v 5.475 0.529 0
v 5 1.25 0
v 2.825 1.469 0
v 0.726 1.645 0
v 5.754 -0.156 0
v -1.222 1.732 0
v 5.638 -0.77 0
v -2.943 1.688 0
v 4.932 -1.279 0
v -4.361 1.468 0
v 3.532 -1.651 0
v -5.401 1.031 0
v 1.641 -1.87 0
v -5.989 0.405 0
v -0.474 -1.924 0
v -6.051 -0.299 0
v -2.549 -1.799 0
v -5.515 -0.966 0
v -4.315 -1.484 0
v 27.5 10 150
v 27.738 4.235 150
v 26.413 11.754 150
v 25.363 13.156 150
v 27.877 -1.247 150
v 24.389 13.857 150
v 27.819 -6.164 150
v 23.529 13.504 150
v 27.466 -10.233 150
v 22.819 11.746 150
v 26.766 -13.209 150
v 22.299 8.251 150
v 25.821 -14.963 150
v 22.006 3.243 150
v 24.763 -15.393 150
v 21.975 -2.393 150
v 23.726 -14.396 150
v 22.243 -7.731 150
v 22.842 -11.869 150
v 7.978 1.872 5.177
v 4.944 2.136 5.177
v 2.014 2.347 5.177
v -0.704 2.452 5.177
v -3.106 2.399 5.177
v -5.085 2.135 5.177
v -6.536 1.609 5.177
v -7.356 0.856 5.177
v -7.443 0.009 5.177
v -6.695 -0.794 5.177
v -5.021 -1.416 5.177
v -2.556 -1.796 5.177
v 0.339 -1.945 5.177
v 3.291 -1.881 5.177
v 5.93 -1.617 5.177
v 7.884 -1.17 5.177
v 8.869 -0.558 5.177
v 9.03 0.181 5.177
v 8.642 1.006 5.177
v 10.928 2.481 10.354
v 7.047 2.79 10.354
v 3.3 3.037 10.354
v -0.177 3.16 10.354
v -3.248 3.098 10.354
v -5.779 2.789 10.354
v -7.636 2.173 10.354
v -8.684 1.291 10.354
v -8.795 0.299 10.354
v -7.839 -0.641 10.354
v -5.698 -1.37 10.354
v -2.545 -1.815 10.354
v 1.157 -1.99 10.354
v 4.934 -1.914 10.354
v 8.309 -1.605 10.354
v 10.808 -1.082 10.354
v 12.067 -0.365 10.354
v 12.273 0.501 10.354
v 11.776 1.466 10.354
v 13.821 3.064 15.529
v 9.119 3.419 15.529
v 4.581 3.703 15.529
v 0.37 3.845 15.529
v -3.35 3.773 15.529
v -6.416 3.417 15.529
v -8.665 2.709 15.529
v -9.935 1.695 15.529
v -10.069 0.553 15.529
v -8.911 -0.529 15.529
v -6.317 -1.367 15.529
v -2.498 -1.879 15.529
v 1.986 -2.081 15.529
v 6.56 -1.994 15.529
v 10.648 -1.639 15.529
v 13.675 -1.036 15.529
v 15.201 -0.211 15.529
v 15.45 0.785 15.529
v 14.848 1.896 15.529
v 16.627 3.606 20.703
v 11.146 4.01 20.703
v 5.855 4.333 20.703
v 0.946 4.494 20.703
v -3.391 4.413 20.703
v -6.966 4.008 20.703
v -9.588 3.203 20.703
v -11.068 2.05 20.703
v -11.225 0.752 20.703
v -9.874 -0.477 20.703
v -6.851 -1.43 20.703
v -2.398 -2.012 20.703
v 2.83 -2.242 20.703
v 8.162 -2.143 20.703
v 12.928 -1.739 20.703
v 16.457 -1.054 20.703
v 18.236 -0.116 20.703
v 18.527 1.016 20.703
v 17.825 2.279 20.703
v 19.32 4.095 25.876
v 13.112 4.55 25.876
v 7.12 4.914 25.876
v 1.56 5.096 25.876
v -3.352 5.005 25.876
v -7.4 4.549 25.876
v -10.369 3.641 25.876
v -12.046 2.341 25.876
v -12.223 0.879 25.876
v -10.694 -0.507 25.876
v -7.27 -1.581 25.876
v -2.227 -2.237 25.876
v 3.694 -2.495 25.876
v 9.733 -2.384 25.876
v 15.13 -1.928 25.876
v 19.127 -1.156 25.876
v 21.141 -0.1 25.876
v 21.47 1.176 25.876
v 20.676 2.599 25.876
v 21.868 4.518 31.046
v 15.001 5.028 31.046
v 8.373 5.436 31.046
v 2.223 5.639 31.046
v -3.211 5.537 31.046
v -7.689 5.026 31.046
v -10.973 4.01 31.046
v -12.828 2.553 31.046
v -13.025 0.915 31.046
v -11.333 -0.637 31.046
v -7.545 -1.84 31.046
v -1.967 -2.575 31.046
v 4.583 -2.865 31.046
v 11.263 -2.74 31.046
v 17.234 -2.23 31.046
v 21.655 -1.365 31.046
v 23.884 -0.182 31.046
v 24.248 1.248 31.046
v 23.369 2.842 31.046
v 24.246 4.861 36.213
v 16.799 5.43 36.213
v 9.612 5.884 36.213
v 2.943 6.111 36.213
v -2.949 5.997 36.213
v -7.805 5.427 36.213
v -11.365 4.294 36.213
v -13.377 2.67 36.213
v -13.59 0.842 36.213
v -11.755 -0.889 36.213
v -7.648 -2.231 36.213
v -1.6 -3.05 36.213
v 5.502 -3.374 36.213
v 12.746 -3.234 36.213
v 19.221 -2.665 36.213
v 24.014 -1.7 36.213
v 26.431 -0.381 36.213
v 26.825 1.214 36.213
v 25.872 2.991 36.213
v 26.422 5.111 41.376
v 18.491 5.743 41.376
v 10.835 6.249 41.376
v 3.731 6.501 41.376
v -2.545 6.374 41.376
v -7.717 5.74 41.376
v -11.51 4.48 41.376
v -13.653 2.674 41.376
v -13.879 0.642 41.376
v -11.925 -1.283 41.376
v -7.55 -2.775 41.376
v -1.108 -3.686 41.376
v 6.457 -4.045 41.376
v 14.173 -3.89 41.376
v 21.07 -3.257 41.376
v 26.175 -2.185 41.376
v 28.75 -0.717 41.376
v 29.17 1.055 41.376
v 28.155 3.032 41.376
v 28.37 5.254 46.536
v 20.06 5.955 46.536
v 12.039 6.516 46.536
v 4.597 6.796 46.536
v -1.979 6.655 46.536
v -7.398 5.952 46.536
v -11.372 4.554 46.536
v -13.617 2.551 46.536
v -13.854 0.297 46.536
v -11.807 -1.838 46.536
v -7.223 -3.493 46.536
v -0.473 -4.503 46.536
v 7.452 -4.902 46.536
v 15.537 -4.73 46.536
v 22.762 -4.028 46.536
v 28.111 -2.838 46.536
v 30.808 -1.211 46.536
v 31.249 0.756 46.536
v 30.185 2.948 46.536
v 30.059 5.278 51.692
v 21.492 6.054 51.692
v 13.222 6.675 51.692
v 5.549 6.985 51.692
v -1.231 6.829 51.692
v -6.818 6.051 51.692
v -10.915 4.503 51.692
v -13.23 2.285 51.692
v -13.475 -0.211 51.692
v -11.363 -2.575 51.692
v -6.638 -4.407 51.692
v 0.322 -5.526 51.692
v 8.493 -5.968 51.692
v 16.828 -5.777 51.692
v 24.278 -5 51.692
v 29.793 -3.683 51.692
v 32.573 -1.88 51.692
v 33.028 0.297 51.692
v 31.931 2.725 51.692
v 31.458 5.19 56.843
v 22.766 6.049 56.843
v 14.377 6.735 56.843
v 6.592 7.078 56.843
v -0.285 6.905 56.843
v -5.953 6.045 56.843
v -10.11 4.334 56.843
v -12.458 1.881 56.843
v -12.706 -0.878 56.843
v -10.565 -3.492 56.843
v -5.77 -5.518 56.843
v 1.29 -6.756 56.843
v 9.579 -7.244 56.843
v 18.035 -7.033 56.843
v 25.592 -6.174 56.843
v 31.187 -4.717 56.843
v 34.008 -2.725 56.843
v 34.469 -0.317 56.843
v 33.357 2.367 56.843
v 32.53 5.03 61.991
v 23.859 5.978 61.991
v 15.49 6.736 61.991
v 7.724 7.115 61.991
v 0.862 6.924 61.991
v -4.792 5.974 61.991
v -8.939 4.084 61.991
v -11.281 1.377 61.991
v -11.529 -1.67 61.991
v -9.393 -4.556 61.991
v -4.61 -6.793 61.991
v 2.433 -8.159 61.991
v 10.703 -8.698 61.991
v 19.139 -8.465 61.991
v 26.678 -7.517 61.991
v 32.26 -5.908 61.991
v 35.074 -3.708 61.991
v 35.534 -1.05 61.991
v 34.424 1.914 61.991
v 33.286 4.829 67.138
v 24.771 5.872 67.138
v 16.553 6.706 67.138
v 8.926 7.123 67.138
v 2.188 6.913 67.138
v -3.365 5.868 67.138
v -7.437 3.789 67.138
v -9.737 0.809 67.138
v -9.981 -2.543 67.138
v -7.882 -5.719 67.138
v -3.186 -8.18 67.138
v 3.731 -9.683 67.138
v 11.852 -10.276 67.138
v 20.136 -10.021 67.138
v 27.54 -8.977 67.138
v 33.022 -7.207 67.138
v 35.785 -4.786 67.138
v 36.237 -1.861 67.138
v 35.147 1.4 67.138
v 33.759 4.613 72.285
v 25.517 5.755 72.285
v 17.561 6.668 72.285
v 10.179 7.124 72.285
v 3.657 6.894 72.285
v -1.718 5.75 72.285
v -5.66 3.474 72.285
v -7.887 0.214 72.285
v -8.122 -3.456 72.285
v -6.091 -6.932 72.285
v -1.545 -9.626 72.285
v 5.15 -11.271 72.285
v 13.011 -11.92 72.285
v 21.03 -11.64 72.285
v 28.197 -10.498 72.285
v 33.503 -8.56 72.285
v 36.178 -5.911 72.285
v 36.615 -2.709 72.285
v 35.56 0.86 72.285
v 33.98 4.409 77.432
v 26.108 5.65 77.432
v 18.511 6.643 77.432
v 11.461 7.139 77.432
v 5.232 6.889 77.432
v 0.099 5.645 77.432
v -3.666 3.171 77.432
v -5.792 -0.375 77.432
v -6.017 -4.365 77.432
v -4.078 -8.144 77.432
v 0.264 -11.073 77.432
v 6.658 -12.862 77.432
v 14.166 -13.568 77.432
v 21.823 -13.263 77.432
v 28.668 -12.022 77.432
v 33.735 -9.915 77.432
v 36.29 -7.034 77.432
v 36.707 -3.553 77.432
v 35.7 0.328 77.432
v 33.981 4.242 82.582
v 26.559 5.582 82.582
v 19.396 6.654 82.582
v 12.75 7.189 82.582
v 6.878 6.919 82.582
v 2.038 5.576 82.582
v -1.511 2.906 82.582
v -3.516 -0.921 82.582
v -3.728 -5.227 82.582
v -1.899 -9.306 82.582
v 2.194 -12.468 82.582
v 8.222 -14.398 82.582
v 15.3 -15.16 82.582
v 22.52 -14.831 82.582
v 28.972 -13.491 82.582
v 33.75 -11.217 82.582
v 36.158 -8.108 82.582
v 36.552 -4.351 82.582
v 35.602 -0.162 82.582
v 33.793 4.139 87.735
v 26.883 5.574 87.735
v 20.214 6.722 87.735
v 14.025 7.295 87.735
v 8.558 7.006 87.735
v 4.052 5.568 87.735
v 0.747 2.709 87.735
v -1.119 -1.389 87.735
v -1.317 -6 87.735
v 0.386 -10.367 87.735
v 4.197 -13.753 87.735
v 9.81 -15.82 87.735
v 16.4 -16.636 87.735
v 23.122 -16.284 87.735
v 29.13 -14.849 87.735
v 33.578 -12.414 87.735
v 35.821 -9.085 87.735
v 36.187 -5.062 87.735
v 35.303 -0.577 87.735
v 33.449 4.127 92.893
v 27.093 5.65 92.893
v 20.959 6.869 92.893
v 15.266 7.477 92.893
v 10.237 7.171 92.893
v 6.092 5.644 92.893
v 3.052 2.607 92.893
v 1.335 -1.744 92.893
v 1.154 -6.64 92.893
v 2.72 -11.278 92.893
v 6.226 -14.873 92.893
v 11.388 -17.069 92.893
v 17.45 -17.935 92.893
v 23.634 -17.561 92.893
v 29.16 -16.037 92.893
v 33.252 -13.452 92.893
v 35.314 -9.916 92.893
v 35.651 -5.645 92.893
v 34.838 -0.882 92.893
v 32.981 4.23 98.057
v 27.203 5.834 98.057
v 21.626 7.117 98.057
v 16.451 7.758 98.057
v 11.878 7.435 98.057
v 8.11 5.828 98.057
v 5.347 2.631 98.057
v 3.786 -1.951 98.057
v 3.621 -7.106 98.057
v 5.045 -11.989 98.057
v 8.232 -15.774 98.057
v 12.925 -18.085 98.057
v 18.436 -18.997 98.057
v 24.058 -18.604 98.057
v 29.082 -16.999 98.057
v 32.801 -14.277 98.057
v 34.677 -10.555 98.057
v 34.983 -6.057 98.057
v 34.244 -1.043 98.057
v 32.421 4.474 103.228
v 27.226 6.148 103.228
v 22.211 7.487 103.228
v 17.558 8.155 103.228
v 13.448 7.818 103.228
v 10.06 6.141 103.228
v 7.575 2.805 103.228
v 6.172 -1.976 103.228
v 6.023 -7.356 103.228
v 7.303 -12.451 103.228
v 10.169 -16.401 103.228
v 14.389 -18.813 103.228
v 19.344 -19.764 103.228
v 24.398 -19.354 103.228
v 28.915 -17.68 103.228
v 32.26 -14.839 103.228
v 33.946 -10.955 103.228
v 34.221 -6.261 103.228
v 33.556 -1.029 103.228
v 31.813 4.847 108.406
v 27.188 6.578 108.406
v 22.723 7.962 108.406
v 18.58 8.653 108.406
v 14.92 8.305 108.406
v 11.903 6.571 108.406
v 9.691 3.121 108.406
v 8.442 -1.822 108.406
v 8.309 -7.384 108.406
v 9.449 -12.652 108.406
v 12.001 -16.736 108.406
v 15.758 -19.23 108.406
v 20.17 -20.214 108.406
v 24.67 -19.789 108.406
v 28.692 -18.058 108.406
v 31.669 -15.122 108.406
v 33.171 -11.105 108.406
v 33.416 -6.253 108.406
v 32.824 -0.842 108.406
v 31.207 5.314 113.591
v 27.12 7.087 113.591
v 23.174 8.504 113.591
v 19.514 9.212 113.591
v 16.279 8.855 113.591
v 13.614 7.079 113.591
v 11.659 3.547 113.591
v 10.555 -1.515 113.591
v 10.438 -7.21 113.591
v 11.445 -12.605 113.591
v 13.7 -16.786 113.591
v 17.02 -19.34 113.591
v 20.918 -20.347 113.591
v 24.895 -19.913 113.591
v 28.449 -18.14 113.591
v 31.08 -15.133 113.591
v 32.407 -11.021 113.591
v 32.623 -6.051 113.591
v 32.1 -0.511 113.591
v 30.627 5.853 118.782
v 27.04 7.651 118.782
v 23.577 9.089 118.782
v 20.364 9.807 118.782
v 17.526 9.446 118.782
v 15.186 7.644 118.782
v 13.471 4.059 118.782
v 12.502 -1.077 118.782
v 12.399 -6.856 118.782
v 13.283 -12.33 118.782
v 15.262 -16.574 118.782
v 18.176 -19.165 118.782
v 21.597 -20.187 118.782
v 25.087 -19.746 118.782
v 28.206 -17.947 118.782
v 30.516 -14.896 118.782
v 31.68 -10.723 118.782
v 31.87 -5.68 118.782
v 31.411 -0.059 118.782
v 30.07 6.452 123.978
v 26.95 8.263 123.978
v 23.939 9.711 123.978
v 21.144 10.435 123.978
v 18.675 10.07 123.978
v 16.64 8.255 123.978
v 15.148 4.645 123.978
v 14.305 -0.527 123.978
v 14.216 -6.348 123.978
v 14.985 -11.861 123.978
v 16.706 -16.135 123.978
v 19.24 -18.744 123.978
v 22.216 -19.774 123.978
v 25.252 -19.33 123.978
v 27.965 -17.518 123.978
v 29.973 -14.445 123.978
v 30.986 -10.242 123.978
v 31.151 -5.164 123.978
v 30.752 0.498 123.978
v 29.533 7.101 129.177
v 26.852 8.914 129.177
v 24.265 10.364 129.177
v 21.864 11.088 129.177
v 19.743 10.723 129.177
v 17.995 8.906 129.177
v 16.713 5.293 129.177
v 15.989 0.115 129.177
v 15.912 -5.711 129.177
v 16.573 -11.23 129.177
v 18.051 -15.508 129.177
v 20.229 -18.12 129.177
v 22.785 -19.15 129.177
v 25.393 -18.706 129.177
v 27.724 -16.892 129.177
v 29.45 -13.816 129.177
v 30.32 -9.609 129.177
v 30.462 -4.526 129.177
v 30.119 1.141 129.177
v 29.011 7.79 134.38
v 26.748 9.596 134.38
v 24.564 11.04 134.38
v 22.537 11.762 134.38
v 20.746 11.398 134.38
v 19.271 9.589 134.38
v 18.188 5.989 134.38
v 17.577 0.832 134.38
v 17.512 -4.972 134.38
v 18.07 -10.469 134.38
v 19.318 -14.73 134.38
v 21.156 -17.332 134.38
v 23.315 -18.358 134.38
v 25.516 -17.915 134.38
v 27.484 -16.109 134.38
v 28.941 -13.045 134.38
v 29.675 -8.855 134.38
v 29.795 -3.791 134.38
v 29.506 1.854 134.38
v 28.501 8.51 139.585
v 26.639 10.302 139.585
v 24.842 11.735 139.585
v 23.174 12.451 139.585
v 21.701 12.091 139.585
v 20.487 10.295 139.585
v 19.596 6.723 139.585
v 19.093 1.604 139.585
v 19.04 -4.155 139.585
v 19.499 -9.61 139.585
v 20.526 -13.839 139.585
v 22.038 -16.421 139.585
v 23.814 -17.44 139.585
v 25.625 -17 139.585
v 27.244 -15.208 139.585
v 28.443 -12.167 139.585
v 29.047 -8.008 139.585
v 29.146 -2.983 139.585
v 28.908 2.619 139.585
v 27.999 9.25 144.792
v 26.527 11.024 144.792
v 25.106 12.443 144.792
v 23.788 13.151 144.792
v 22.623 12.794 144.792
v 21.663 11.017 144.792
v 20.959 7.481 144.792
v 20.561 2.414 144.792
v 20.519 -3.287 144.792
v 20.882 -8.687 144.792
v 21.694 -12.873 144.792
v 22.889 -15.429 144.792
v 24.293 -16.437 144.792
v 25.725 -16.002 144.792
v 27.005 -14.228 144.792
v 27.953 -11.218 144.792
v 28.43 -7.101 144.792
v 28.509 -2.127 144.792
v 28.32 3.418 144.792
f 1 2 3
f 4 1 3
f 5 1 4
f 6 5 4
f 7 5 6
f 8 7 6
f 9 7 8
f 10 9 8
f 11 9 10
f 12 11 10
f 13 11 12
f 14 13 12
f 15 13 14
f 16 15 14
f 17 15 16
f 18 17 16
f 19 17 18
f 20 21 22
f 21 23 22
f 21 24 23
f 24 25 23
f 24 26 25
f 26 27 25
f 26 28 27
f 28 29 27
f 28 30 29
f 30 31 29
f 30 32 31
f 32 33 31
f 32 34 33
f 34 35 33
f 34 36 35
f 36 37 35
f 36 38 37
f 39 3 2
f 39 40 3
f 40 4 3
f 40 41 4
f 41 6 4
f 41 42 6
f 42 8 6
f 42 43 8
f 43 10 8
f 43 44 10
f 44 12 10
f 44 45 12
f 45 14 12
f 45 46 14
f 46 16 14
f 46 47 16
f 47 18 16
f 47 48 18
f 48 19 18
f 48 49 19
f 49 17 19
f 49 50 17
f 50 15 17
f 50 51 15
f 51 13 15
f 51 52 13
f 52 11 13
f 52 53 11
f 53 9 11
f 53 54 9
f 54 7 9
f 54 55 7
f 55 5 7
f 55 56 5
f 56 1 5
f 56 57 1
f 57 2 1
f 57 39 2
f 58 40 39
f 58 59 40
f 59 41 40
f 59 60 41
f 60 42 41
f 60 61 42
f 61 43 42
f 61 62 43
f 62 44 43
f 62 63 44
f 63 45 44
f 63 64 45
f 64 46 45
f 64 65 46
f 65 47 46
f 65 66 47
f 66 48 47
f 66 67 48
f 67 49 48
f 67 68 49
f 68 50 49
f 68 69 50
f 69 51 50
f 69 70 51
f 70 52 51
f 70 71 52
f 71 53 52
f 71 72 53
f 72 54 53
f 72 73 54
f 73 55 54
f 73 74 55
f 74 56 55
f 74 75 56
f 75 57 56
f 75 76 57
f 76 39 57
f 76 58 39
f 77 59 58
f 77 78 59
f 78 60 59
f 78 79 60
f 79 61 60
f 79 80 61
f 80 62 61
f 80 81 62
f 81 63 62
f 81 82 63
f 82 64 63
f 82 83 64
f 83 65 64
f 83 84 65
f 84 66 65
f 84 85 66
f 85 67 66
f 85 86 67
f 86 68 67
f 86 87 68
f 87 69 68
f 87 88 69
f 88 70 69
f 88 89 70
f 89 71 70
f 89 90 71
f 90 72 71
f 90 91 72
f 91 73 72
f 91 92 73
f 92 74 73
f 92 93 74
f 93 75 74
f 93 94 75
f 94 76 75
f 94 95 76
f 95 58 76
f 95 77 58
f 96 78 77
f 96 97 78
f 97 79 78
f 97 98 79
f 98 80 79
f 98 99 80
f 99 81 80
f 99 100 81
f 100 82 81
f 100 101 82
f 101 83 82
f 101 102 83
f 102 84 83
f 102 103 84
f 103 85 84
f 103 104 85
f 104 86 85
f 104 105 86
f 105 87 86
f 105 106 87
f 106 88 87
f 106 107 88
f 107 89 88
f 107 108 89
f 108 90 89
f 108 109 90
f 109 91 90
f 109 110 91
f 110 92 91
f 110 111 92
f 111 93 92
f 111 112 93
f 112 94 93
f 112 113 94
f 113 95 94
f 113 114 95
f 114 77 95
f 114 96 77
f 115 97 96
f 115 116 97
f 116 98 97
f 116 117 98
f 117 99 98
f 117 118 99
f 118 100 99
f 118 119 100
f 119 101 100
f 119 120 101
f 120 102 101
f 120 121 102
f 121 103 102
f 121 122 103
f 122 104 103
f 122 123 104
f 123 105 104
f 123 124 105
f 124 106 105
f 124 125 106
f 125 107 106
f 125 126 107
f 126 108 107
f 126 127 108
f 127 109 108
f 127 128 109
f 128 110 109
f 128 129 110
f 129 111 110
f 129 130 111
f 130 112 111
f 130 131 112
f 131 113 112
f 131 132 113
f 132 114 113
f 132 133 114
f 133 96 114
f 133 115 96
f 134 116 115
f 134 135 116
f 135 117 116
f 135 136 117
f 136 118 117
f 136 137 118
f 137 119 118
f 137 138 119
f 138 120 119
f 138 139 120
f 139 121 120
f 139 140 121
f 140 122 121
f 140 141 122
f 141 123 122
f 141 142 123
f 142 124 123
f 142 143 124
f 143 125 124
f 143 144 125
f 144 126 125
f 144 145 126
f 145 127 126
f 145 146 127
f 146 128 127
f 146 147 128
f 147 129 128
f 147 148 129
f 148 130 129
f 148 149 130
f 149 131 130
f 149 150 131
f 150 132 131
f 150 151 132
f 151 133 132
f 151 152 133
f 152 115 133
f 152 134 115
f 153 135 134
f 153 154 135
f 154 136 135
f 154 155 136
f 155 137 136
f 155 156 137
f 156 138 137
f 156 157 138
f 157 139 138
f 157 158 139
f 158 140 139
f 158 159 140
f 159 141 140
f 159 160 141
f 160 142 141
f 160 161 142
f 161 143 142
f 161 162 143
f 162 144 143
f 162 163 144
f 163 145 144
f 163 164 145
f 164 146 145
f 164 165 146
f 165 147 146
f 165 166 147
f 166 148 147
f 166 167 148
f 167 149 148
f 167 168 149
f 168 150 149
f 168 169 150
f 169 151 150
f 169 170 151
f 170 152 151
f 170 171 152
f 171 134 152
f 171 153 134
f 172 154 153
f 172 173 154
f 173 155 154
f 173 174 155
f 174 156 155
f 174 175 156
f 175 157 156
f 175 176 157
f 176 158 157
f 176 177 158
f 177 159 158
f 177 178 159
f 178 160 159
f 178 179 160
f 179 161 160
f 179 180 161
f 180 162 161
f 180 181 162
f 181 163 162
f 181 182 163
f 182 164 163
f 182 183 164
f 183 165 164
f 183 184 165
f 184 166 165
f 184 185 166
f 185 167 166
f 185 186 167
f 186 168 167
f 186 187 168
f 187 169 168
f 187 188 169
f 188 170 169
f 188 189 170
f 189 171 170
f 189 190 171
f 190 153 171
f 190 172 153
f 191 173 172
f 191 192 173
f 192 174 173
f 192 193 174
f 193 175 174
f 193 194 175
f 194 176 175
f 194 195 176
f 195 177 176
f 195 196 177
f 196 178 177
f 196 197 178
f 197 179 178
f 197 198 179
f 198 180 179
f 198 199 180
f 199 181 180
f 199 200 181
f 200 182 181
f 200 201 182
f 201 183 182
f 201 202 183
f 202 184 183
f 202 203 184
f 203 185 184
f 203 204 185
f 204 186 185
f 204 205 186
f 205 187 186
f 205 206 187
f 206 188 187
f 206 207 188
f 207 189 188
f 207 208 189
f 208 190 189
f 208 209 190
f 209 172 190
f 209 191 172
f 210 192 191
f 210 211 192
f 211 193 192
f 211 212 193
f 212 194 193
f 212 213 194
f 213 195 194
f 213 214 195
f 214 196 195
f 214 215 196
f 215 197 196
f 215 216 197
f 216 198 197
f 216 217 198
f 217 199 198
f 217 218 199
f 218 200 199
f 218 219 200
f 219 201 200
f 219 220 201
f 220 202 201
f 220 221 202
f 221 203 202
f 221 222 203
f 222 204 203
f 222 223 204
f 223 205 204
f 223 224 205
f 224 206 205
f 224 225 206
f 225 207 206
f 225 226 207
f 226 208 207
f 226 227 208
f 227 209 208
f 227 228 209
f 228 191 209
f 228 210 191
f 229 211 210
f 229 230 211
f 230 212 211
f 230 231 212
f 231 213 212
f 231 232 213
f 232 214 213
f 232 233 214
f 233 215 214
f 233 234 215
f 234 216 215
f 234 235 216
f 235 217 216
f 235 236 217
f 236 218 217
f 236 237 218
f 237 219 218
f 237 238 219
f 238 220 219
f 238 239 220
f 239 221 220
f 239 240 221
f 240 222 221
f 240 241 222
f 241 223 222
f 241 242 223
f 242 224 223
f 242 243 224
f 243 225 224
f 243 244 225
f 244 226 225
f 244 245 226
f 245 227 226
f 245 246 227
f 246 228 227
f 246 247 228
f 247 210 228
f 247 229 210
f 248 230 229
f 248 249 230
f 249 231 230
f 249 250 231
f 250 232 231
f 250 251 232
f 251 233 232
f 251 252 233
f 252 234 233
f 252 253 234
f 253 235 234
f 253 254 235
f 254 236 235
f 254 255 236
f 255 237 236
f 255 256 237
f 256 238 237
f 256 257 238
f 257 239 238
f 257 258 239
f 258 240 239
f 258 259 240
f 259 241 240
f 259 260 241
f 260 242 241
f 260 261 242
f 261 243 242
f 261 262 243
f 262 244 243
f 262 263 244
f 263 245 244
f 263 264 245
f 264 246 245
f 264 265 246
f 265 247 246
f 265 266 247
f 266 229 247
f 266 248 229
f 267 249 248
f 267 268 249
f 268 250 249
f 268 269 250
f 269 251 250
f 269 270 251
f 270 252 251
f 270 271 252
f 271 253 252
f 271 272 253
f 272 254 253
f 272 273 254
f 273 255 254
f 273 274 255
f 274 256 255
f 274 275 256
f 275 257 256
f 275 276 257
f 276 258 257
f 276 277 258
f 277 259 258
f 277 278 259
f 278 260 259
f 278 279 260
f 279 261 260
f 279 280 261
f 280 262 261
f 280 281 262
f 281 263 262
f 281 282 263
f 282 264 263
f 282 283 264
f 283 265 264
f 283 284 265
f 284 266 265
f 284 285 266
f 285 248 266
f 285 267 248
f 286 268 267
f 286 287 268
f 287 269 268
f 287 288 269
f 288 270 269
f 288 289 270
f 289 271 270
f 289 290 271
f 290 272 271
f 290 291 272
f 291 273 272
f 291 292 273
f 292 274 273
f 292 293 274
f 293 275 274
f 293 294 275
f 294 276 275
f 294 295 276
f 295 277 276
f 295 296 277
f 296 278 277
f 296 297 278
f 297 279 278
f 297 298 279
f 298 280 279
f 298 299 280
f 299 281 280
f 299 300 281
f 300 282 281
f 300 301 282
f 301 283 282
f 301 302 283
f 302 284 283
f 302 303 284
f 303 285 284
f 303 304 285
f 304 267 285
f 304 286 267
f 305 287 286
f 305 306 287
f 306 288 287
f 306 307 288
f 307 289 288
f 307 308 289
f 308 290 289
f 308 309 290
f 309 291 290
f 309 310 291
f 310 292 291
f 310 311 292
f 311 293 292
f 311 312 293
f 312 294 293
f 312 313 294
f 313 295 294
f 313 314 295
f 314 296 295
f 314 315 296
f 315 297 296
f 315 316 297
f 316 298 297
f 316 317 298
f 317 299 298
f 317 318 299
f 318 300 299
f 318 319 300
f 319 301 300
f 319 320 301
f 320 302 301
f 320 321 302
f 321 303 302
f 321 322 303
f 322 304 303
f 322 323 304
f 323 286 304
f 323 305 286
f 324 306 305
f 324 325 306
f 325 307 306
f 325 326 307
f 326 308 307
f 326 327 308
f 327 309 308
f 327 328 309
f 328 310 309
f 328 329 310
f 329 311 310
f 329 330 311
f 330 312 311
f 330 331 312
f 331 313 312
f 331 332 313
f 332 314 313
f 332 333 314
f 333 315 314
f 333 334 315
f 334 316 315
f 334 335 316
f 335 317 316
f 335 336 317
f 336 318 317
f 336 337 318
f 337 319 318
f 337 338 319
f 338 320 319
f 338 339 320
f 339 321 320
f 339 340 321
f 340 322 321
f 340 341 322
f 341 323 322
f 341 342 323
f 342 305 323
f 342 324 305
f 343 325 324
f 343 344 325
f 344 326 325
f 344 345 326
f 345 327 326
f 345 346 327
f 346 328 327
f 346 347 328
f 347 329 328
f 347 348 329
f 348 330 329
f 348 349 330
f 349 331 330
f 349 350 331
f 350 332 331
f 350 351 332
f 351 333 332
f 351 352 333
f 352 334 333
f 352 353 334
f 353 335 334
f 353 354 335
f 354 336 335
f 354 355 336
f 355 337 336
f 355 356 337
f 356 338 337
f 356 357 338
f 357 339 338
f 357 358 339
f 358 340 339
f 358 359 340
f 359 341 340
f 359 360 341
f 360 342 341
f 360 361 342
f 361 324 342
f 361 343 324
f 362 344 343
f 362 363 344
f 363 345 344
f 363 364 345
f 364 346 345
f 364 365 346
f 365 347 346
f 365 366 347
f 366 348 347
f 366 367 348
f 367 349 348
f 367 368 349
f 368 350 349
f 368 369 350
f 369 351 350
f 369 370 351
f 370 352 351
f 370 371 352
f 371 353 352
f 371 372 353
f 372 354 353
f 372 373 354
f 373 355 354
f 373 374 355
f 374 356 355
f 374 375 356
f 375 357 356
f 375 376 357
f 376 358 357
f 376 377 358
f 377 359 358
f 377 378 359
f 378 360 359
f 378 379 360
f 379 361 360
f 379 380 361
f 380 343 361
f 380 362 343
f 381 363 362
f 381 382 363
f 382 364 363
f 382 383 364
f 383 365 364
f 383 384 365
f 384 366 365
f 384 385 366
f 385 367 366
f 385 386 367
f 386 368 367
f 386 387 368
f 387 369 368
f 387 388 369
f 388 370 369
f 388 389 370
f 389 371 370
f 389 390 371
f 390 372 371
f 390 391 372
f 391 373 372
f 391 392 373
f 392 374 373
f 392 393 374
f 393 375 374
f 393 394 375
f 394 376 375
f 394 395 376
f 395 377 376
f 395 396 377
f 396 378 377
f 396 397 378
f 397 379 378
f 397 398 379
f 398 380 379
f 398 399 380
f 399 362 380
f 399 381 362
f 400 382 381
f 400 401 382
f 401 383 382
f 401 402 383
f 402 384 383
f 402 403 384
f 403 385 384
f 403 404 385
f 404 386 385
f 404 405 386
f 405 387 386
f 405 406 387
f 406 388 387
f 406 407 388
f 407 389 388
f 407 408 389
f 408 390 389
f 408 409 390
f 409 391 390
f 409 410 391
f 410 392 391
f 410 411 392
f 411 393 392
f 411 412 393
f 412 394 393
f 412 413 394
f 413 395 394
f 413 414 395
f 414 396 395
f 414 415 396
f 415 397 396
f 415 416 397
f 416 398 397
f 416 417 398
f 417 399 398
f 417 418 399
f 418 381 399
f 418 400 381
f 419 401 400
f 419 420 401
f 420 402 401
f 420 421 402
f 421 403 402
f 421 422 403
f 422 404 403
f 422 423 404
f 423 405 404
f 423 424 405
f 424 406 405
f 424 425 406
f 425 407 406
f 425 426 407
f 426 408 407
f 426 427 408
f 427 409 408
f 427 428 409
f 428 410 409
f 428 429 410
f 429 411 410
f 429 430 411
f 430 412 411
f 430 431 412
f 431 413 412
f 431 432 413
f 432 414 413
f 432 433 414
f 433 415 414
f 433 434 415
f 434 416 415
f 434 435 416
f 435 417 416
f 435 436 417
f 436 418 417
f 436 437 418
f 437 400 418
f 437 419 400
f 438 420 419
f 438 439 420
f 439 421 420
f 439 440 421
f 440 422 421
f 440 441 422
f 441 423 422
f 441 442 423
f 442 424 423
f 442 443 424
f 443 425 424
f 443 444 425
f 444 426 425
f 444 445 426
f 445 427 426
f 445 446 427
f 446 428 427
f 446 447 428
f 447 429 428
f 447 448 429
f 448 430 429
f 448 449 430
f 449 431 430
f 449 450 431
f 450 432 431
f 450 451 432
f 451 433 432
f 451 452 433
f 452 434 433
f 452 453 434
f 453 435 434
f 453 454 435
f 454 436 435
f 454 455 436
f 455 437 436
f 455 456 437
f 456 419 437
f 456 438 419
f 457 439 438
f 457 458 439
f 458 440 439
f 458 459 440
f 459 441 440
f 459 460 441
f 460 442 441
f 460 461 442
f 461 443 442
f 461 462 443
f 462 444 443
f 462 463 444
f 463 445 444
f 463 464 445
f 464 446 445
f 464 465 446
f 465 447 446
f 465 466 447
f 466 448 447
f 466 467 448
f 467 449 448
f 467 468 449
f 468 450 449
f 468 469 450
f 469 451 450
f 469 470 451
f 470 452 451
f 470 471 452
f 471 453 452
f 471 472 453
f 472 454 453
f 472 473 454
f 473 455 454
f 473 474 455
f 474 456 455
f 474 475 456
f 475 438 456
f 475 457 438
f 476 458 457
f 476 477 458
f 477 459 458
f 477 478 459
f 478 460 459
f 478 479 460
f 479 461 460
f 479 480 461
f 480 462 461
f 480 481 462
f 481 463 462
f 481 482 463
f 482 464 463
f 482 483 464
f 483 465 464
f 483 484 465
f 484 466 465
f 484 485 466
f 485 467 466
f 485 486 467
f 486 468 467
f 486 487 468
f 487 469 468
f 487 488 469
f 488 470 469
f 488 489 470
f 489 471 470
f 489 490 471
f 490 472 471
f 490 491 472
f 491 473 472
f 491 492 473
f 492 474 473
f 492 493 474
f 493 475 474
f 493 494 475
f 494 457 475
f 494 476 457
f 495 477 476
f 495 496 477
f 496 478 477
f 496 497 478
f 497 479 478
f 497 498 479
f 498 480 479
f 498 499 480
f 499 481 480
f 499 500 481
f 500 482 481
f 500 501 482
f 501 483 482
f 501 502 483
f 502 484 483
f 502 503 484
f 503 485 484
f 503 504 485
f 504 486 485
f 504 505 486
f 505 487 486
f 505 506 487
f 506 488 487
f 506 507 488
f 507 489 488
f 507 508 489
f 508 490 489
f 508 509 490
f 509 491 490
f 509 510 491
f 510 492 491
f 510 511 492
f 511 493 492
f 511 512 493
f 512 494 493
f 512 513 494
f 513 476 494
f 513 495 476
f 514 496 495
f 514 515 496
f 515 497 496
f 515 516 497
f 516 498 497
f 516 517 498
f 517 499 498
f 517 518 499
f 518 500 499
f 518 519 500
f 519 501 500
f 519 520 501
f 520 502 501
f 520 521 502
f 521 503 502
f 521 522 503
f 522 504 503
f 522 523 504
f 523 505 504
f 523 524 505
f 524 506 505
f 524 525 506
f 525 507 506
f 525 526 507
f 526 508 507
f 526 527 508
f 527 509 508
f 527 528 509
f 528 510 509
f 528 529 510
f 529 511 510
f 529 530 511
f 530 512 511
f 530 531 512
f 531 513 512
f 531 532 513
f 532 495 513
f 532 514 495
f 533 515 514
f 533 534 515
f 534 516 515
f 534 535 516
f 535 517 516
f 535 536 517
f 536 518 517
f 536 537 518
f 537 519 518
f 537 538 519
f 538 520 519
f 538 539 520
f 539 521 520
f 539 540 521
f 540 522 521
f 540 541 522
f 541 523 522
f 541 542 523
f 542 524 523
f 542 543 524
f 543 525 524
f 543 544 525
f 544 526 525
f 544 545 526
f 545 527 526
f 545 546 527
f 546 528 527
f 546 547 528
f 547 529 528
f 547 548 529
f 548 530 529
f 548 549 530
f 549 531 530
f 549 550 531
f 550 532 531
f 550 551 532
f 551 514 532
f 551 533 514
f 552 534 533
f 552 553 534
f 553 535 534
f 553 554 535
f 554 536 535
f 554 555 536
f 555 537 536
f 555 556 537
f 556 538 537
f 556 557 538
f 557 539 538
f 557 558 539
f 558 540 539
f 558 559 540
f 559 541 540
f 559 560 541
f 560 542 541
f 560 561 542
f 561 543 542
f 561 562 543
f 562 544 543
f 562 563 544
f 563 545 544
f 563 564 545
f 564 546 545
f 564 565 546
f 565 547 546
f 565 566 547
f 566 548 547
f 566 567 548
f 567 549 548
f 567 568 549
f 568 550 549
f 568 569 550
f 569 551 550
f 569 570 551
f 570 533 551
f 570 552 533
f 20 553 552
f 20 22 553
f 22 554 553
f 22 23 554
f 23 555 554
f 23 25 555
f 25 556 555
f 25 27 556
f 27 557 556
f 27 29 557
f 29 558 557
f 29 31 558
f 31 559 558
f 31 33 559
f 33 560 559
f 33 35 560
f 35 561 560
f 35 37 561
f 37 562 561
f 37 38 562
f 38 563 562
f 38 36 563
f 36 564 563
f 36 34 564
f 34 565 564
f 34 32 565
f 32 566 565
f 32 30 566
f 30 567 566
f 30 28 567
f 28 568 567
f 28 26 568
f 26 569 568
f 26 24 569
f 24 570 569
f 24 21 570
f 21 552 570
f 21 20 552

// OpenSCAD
// file: boat_propeller-nSpline_library/files/Naca4.scad
// Naca4.scad - library for parametric airfoils of 4 digit NACA series
// Code: Rudolf Huttary, Berlin 
// June 2015
// commercial use prohibited


// general use: for more examples refer to sampler.scad
// naca = naca digits or 3el vector  (default = 12 or [0, 0, .12])
// L    = chord length [mm]      (default= 100)
// N    = # sample points        (default= 81)
// h    = height [mm]            (default= 1)
// open = close at the thin end? (default = true)
// two equivalent example calls
 airfoil(naca = 2408, L = 60, N=1001, h = 30, open = false); 
// airfoil(naca = [.2, .4, .32], L = 60, N=1001, h = 30, open = false); 

module help()
{
  echo(str("\n\nList of signatures in lib:\n=================\n", 
  "module airfoil(naca=2412, L = 100, N = 81, h = 1, open = false) - renders airfoil object\n", 
  "module airfoil(naca=[.2, .4, .12], L = 100, N = 81, h = 1, open = false) - renders airfoil object using percentage for camber,  camber distance and thicknes\n", 
  "function airfoil_data(naca=12, L = 100, N = 81, open = false)\n",
  "=================\n")); 
}

help(); 
// this is the object
module airfoil(naca=12, L = 100, N = 81, h = 1, open = false)
{
  linear_extrude(height = h)
  polygon(points = airfoil_data(naca, L, N, open)); 
}

// this is the main function providing the airfoil data
function airfoil_data(naca=12, L = 100, N = 81, open = false) = 
  let(Na = len(naca)!=3?NACA(naca):naca)
  let(A = [.2969, -0.126, -.3516, .2843, open?-0.1015:-0.1036])
  [for (b=[-180:360/(N):179.99]) 
    let (x = (1-cos(b))/2)  
    let(yt = sign(b)*Na[2]/.2*(A*[sqrt(x), x, x*x, x*x*x, x*x*x*x])) 
    Na[0]==0?L*[x, yt]:L*camber(x, yt, Na[0], Na[1], sign(b))];  

// helper functions
function NACA(naca) =               // generates vector from NACA num
  let (M = floor(naca/1000))
  let (P = floor((naca-M*1000)/100)) 
  [M/100, P/10, floor(naca-M*1000-P*100)/100];  

function camber(x, y, M, P, upper) = 
  let(yc = (x<P)?M/P/P*(2*P*x-x*x): M/(1-P)/(1-P)*(1 - 2*P + 2*P*x -x*x))
  let(dy = (x<P)?2*M/P/P*(P-x):2*M/(1-P)/(1-P)*(P-x))
  let(th = atan(dy))
  [upper ? x - y*sin(th):x + y*sin(th), upper ? yc + y*cos(th):yc - y*cos(th)];
// file: boat_propeller-nSpline_library/files/Naca_sweep.scad
// Naca4_sweep.scad - sweep library
// Code: Rudolf Huttary, Berlin 
// 1st release : June 2015
// last update: 2017.02.10
// commercial use prohibited

use <Naca4.scad>

//example1(); 
//rotate([80, 180, 130])
example(); 

// sweep from NACA1480 to NACA6480 (len = 230 mm, winding y,z = 80°
// sweeps generates a single polyhedron from multiple datasets
module example()
{
  N = 40; 
  sweep(gen_dat(N=5, dz=1,N=N), showslices = false); 
//  sweep(gen_dat(N=5, dz=1,N=N), showslices = true); 
  
  // specific generator function
  function gen_dat(M=10,dz=.1,N=10) = [for (i=[1:dz:M])   
    let( L = length(i))
    let( af = vec3D(
        airfoil_data([.1,.5,thickness(i)], L=length(i), N = N)))
    T_(-L/2, 0, (i+1)*2, af)];  // translate airfoil
  
  function thickness(i) = .5*sin(i*i)+.1; 
  function length(i) = (60+sin(12*(i-3))*30); 
}

module help()
{
  echo(str("\n\nNaca4_sweep library by Rudolf Huttary\n",
  "List of signatures in lib:\n=================\n", 
  "sweep(dat, convexity = 5, showslices = false, close = false, planar_caps = false)  // dat - vec of vec2, with vec1 = airfoil_data\n", 
  "function vec3D(v, z=0)  // expand vec2 to vec3",
  "function rot(w=0, p) // rotate vec2",
  "function T_(x=0, y=0, z=0, v) // translates vec of vec3\n", 
  "function R_(x=0, y=0, z=0, v) // rotates vec of vec3\n", 
  "function Rx_(x=0, v) // x-rotates vec of vec3\n", 
  "function Ry_(y=0, v) // y-rotates vec of vec3\n", 
  "function Rz_(z=0, v) // z-rotates vec of vec3\n", 
  "function T_(x=0, y=0, z=0, v) // translates vec of vec3\n", 
  "function Tx_(x=0, v) // x-translates vec of vec3\n", 
  "function Ry_(y=0, v) // y-translates vec of vec3\n", 
  "function Rz_(z=0, v) // z-translates vec of vec3\n", 
  "function S_(x=0, y=0, z=0, v) // scales vec of vec3\n", 
  "function Sx_(x=0, v) // x-translates vec of vec3\n", 
  "function Sy_(x=0, v) // y-translates vec of vec3\n", 
  "function Sz_(x=0, v) // z-translates vec of vec3\n", 
  "=================\n")); 
}


// generate polyhedron from multiple airfoil_datasets
// dat - vec of vec1, with vec1 = simple polygon like airfoil_data, > 3 points per dataset expected
// use "planar_caps = false" only for non-planar cap faces with cord line symmetry
module sweep(dat, convexity = 5, showslices = false, close = false, planar_caps = false) 
{
  n = len(dat);     // # datasets
  l = len(dat[0]);  // points per dataset 
  if(l<=3) echo("ERROR: sweep() expects more than 3 points per dataset"); 
  if (showslices)  
    for(i=[0:n-1]) polyhedron(points = dat[i], faces = [count(l-1, 0)]);
  else
  {
    obj = sweep_(dat, close=close, planar_caps=planar_caps); 
    polyhedron(obj[0], obj[1], convexity = 5); 
  }
}
  function count(a, b) = [for (i=[a:(a<b?1:-1):b]) i]; 

function sweep_(dat, close = false, planar_caps = true) =   //returns [points, faces]; 
  let(n=len(dat), l=len(dat[0]))
  let(first = planar_caps?[count(l-1, 0)]: 
            faces_polygon(l, true))  // indices first face
  let(last = planar_caps?[count((n-1)*l,(n)*l-1)]: 
            faces_shift((n-2)*l, faces_polygon(l, false))) // indices last face
  let(faces = close?faces_sweep(l,n, close) :concat(first, last, faces_sweep(l,n))) 
  let(points = [for (i=[0:n-1], j=[0:l-1]) dat[i][j]]) // flatten points vector
    [points, faces]; 

function faces_shift(d, dat) = [for (i=[0:len(dat)-1]) dat[i] + [d, d, d]]; 

  
function del(A, n) = [for(i=[0:len(A)-1]) if (n!=i)A[i]]; 

//// knitting for polyhedron
  function faces_sweep(l, n=1, close = false) = 
      let(M = n*l, n1=close?n+1:n) 
      concat([[0,l,l-1]],   // first face
             [for (i=[0:l*(n1-1)-2], j = [0,1])
                j==0? [i, i+1, (i+l)%M] 
                    : [i+1, (i+l+1)%M, (i+l)%M]
             ]
             ,[[(n1*l-1)%M, (n1-1)*l-1, ((n1-1)*l)%M]
             ]); // last face
      ;
    
  function faces_polygon(l, first = true) = let(odd = (l%2==1), d=first?0:l)
    let(res = odd?concat([[d,d+1,d+l-1]],
      [for (i=[1:(l-3)/2], j=[0,1])(j==0)?[d+i,d+i+1,d+l-i]:[d+i+1,d+l-i-1, d+l-i]]):
      [for (i=[0:(l-4)/2], j=[0,1])(j==0)?[d+i,d+i+1,d+l-i-1]:[d+i+1,d+l-i-2, d+l-i-1]])
    first?facerev(res):res;
    
  function facerev(dat) = [for (i=[0:len(dat)-1]) [dat[i][0],dat[i][2],dat[i][1]]]; 



//// vector and vector set operation stuff ///////////////////////
//// Expand 2D vector into 3D
function vec3D(v, z=0) = [for(i = [0:len(v)-1]) 
  len(v[i])==2?[v[i][0], v[i][1], z]:v[i]+[0, 0, z]]; 

// Translation - 1D, 2D, 3D point vector //////////////////////////
// vector along all axes
function T_(x=0, y=0, z=0, v) = let(x_ = (len(x)==3)?x:[x, y, z])
  [for (i=[0:len(v)-1]) T__(x_[0], x_[1], x_[2], p=v[i])]; 
/// vector along one axis
function Tx_(x=0, v) = T_(x=x, v=v); 
function Ty_(y=0, v) = T_(y=y, v=v); 
function Tz_(z=0, v) = T_(z=z, v=v); 
/// point along all axes 1D, 2D, 3D allowed
function T__(x=0, y=0, z=0, p) = len(p)==3?p+[x, y, z]:len(p)==2?p+[x, y]:p+x; 

//// Rotation - 2D, 3D point vector ///////////////////////////////////
// vector around all axes 
function R_(x=0, y=0, z=0, v) =             // 2D vectors allowed 
  let(x_ = (len(x)==3)?x:[x, y, z])
  len(v[0])==3?Rz_(x_[2], Ry_(x_[1], Rx_(x_[0], v))):
  [for(i = [0:len(v)-1]) rot(x_[2], v[i])];  
// vector around one axis
function Rx_(w, A) = A*[[1, 0, 0], [0, cos(w), sin(w)], [0, -sin(w), cos(w)]]; 
function Ry_(w, A) = A*[[cos(w), 0, sin(w)], [0, 1, 0], [-sin(w), 0, cos(w)]]; 
function Rz_(w, A) = A*[[cos(w), sin(w), 0], [-sin(w), cos(w), 0], [0, 0, 1]]; 


//// Scale - 2D, 3D point vector ///////////////////////////////////
// vector along all axes 
function S_(x=1, y=1, z=1, v) = 
  [for (i=[0:len(v)-1]) S__(x,y,z, v[i])]; 
// vector along one axis
function Sx_(x=0, v) = S_(x=x, v=v); 
function Sy_(y=0, v) = S_(y=y, v=v); 
function Sz_(z=0, v) = S_(z=z, v=v); 
// single point in 2D
function S__(x=1, y=1, z=1, p) = 
  len(p)==3?[p[0]*x, p[1]*y, p[2]*z]:len(p)==2?[p[0]*x+p[1]*y]:[p[0]*x]; 

 
 
// main file
use <boat_propeller-nSpline_library/files/splines.scad>
use <boat_propeller-nSpline_library/files/Naca_sweep.scad> 


dat2=gen_segment_dat();
sweep(dat2);
//actuator_attachments(dat2, 0.1, 0.1, dat2, 0.3, 50);



function gen_segment_dat(
        M=20,   // number of facets around limb
        N=30,   // number of facets along length
        A=[ [10,5,0], [-10,5,0], [-10,-5,0], [10,-5,0], [10,5,0],] , // cross section data
        B=[ [0.5,0.25,0], [2,1,0], [1,2,0], [0.25,2,0], ] ,          // cross-section mod params
        C=[ [0,0,0], [10,1,50], [20,-5,100], [25,0,150], ]         // path data
    ) =
    let(cross_section = nSpline(A,50))
    let(path = nSpline(C,N))
    let(mod_params = nSpline(B,N))
    gen_sweep_dat(path,mod_params,A,M,N);


module actuator_attachments(segment1, s1longitude, s1latitude, segment2, s2longitude, actuator_length){ // segments = dat array of vertices, lat long as 0.0-1.0
    // origin 
    N1=len(segment1);
    M1=len(segment1[0]);
    origin_vertex = segment1[s1longitude*N1][s1latitude*M1];
    translate(origin_vertex) rotate([0,0,s1longitude*360])  cylinder(h=3,r1=1,r2=1.5);
    // insertion
    N2=len(segment2);
    M2=len(segment2[0]);
    s2latitude_index = 
        get_insertion_lat_index(
            segment2, s2longitude*M2,origin_vertex, actuator_length, 0);
    insertion_vertex = segment2[s2latitude_index][s2longitude*M2];
    translate(insertion_vertex) rotate([0,0,s1longitude*360]) color("blue") 
                                                    cylinder(h=3,r1=1,r2=1.5);
    }

function get_insertion_lat_index(dat,longindex,origin,actuator_len,i)=                      // recursive fn searches for 1st apex <= actuator_len
    let(distance = dist(origin,dat[i][longindex]) )
    (distance>actuator_len || i>60)?i:
        get_insertion_lat_index(dat,longindex,origin,actuator_len,i+1);

function dist(pointA=[0,0,0],pointB=[1,1,1]) =                                              // L2 distance between two points
    sqrt(
    pow(pointA[0]-pointB[0],2) + 
    pow(pointA[1]-pointB[1],2) + 
    pow(pointA[2]-pointB[2],2) 
    );

function normal(segment2, index_longitude, index_latitude) =                             // return normal vector of vertex
    let(N2= len(segment2))
    let(M2= len(segment2[0]))
    let(point0= segment2[index_longitude*N2][index_latitude*M2])
    let(point1= segment2[index_longitude*N2][index_latitude*M2-1])
    let(point2= segment2[index_longitude*N2-1][index_latitude*M2])
    [N2,M2,index_longitude, index_latitude,point0, point1, point2];

function gen_xSec(A,Bx,By) =                                                              // return points of x-section polygon, modified by B
   [ for (i=[0:len(A)-1]) 
       [ A[i][0]*Bx , A[i][1]*By, A[i][2] ]
   ];
   
function gen_sweep_dat(path,mod_params,A,M,N) = [                                     // return [array of polygons[arrayof vertices[x,y,z]]] 
   for(i=[0:N-1])
       let(perim=gen_xSec(nSpline(A,M),mod_params[i][0],mod_params[i][1]) )
        T_(path[i][0],path[i][1],path[i][2], perim)
   ];
  
